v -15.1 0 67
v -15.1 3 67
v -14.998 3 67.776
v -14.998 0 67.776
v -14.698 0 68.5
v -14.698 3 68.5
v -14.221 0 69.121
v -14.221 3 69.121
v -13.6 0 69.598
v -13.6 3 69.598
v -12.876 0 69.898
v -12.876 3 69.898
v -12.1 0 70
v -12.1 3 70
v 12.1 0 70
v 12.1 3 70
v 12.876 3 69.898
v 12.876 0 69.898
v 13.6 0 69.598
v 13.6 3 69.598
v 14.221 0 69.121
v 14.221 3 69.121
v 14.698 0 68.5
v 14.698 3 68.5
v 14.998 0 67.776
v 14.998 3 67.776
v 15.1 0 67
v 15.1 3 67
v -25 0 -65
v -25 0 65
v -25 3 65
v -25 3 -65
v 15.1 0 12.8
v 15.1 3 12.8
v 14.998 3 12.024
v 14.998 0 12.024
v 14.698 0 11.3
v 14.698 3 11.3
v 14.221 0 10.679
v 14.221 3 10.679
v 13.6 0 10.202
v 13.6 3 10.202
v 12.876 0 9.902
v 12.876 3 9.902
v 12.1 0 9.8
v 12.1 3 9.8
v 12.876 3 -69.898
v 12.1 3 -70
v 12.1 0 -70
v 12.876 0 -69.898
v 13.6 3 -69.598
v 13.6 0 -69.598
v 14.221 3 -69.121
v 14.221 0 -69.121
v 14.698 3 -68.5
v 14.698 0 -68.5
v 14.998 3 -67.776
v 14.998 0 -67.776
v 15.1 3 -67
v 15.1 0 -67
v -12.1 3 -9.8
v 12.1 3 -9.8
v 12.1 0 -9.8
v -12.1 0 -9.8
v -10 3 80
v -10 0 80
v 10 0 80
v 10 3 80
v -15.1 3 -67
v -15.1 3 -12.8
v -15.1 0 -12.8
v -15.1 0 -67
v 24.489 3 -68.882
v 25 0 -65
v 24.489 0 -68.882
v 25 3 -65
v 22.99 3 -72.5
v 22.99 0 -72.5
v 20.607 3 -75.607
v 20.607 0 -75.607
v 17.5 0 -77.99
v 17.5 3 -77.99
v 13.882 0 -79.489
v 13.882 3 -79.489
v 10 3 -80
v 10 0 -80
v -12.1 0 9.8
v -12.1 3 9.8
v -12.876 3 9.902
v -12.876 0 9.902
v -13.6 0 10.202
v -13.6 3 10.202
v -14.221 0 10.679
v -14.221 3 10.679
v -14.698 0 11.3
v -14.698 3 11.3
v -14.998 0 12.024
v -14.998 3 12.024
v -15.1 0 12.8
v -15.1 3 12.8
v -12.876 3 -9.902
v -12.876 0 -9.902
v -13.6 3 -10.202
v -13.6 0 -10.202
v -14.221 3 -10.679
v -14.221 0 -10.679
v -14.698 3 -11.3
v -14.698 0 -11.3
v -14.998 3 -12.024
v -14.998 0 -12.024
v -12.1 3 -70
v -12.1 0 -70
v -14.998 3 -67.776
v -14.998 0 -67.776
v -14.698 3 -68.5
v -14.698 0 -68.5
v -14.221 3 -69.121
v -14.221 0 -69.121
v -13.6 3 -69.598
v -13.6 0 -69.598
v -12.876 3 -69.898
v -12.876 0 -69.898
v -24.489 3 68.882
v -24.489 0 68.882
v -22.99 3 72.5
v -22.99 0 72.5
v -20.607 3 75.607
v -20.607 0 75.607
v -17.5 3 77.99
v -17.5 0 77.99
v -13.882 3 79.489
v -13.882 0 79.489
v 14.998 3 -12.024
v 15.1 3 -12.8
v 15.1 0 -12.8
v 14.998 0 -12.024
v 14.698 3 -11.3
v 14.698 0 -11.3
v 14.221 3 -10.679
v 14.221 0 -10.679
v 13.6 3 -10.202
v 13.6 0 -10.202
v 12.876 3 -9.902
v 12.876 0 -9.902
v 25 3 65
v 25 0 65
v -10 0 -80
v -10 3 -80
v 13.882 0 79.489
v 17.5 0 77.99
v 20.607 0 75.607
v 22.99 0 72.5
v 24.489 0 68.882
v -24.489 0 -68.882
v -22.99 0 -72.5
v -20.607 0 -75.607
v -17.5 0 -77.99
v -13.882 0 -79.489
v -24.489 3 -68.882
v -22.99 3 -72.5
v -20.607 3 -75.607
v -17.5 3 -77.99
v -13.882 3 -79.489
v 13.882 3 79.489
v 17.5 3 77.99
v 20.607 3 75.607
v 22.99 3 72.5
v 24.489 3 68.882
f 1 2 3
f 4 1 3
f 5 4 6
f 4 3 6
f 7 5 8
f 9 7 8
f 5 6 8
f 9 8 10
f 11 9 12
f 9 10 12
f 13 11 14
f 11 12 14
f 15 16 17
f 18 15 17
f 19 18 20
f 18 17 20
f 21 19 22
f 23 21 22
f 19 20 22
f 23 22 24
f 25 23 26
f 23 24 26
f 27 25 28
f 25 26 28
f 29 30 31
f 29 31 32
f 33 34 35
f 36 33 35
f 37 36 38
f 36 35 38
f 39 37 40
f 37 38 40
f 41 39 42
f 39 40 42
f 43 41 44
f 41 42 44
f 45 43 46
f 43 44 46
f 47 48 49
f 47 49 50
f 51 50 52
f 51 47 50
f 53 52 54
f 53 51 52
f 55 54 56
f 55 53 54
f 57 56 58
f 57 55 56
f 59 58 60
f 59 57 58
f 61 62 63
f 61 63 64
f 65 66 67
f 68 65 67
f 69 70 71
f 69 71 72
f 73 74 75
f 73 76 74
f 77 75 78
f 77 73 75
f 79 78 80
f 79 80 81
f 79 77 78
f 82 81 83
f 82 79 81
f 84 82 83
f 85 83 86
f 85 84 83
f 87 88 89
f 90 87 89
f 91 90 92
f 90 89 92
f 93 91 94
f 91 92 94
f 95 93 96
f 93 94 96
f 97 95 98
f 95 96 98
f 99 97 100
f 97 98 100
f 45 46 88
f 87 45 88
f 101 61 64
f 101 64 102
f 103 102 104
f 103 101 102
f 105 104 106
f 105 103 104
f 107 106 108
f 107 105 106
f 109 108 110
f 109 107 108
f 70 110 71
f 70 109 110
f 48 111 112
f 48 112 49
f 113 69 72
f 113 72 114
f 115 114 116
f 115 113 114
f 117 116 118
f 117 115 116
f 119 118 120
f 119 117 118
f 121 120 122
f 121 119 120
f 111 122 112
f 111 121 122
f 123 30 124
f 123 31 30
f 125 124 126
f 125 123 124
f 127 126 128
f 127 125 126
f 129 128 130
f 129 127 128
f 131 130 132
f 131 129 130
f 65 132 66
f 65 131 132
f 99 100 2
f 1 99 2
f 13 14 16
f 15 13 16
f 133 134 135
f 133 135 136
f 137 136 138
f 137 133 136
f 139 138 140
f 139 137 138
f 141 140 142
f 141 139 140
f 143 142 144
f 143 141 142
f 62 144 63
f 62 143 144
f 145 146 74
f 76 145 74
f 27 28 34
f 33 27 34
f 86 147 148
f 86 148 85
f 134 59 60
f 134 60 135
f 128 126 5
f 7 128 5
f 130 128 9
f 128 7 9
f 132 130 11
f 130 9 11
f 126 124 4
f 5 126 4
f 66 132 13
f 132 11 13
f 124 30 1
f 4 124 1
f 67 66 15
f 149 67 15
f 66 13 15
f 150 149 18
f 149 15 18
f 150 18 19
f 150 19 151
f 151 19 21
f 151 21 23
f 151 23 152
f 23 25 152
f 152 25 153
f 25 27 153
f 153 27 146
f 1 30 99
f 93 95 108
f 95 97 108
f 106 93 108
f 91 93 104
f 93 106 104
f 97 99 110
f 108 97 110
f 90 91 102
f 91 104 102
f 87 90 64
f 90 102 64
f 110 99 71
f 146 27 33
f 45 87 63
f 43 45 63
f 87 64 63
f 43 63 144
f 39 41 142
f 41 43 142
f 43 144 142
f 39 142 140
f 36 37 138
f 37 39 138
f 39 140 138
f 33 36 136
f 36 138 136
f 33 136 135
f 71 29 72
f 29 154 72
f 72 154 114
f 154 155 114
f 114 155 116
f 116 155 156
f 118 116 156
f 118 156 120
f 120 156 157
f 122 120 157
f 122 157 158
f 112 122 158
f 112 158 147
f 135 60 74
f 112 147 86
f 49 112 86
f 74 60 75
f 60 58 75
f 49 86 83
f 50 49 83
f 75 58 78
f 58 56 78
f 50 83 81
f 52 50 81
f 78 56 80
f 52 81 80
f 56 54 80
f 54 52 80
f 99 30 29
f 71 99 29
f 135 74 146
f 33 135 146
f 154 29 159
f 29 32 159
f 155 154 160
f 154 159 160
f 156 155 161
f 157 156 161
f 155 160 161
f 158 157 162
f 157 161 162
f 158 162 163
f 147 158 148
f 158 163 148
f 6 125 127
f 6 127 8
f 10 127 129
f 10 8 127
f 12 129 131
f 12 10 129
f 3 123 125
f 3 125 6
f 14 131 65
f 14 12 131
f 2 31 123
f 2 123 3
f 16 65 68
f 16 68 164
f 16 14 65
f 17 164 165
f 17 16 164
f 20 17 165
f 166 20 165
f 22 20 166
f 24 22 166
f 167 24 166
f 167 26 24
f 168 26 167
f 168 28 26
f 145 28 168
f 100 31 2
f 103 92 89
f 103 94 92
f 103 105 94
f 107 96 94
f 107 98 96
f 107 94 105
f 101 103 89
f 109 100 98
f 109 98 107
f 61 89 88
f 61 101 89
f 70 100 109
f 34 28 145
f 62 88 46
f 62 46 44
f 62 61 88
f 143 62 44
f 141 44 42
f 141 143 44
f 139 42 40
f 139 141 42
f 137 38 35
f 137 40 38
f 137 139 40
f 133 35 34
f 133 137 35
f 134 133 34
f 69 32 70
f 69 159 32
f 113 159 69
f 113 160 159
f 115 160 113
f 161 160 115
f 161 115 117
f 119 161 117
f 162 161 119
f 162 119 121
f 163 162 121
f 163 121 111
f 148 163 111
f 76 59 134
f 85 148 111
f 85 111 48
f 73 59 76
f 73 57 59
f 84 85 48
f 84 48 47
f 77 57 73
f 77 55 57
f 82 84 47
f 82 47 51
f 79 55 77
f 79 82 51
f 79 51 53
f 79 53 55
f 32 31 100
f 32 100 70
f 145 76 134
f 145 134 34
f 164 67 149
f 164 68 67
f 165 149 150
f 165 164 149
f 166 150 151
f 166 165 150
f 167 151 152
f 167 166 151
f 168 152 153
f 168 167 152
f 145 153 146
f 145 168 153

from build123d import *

# Parameters (mm, degrees)
SKETCH1_W           = 50
SKETCH1_H           = 160
BOSS_EXTRUDE1_DEPTH = 3
FILLET2_R           = 15
CUT_EXTRUDE1_DEPTH  = 4


with BuildPart() as part:
    # Sketch1 → Boss-Extrude1 (new body)
    with BuildSketch(Plane(origin=(0, 0, 0), x_dir=(1, 0, 0), z_dir=(0, 1, 0))):
        Rectangle(SKETCH1_W, SKETCH1_H)
    extrude(amount=BOSS_EXTRUDE1_DEPTH)

    # Fillet2
    fillet2_edges = [part.edges().sort_by_distance(p)[0] for p in [
        (25, 1.5, 80),
        (-25, 1.5, 80),
        (-25, 1.5, -80),
        (25, 1.5, -80),
    ]]
    fillet(fillet2_edges, radius=FILLET2_R)

    # Sketch3 → Cut-Extrude1 (cut, through all)
    with BuildSketch(Plane(origin=(0, 3, 0), x_dir=(1, 0, 0), z_dir=(0, 1, 0))):
        with BuildLine():
            Line((-12.1, 70), (12.1, 70))
            ThreePointArc((12.1, 70), (14.221320344, 69.121320344), (15.1, 67))
            Line((15.1, 67), (15.1, 12.8))
            ThreePointArc((15.1, 12.8), (14.221320344, 10.678679656), (12.1, 9.8))
            Line((12.1, 9.8), (-12.1, 9.8))
            ThreePointArc((-12.1, 9.8), (-14.221320344, 10.678679656), (-15.1, 12.8))
            Line((-15.1, 12.8), (-15.1, 67))
            ThreePointArc((-15.1, 67), (-14.221320344, 69.121320344), (-12.1, 70))
        make_face()
    cut_extrude1 = extrude(amount=-CUT_EXTRUDE1_DEPTH, mode=Mode.SUBTRACT)

    # Mirror1: Cut-Extrude1 across plane
    add(cut_extrude1.mirror(Plane.XY), mode=Mode.SUBTRACT)


solid = part.part
